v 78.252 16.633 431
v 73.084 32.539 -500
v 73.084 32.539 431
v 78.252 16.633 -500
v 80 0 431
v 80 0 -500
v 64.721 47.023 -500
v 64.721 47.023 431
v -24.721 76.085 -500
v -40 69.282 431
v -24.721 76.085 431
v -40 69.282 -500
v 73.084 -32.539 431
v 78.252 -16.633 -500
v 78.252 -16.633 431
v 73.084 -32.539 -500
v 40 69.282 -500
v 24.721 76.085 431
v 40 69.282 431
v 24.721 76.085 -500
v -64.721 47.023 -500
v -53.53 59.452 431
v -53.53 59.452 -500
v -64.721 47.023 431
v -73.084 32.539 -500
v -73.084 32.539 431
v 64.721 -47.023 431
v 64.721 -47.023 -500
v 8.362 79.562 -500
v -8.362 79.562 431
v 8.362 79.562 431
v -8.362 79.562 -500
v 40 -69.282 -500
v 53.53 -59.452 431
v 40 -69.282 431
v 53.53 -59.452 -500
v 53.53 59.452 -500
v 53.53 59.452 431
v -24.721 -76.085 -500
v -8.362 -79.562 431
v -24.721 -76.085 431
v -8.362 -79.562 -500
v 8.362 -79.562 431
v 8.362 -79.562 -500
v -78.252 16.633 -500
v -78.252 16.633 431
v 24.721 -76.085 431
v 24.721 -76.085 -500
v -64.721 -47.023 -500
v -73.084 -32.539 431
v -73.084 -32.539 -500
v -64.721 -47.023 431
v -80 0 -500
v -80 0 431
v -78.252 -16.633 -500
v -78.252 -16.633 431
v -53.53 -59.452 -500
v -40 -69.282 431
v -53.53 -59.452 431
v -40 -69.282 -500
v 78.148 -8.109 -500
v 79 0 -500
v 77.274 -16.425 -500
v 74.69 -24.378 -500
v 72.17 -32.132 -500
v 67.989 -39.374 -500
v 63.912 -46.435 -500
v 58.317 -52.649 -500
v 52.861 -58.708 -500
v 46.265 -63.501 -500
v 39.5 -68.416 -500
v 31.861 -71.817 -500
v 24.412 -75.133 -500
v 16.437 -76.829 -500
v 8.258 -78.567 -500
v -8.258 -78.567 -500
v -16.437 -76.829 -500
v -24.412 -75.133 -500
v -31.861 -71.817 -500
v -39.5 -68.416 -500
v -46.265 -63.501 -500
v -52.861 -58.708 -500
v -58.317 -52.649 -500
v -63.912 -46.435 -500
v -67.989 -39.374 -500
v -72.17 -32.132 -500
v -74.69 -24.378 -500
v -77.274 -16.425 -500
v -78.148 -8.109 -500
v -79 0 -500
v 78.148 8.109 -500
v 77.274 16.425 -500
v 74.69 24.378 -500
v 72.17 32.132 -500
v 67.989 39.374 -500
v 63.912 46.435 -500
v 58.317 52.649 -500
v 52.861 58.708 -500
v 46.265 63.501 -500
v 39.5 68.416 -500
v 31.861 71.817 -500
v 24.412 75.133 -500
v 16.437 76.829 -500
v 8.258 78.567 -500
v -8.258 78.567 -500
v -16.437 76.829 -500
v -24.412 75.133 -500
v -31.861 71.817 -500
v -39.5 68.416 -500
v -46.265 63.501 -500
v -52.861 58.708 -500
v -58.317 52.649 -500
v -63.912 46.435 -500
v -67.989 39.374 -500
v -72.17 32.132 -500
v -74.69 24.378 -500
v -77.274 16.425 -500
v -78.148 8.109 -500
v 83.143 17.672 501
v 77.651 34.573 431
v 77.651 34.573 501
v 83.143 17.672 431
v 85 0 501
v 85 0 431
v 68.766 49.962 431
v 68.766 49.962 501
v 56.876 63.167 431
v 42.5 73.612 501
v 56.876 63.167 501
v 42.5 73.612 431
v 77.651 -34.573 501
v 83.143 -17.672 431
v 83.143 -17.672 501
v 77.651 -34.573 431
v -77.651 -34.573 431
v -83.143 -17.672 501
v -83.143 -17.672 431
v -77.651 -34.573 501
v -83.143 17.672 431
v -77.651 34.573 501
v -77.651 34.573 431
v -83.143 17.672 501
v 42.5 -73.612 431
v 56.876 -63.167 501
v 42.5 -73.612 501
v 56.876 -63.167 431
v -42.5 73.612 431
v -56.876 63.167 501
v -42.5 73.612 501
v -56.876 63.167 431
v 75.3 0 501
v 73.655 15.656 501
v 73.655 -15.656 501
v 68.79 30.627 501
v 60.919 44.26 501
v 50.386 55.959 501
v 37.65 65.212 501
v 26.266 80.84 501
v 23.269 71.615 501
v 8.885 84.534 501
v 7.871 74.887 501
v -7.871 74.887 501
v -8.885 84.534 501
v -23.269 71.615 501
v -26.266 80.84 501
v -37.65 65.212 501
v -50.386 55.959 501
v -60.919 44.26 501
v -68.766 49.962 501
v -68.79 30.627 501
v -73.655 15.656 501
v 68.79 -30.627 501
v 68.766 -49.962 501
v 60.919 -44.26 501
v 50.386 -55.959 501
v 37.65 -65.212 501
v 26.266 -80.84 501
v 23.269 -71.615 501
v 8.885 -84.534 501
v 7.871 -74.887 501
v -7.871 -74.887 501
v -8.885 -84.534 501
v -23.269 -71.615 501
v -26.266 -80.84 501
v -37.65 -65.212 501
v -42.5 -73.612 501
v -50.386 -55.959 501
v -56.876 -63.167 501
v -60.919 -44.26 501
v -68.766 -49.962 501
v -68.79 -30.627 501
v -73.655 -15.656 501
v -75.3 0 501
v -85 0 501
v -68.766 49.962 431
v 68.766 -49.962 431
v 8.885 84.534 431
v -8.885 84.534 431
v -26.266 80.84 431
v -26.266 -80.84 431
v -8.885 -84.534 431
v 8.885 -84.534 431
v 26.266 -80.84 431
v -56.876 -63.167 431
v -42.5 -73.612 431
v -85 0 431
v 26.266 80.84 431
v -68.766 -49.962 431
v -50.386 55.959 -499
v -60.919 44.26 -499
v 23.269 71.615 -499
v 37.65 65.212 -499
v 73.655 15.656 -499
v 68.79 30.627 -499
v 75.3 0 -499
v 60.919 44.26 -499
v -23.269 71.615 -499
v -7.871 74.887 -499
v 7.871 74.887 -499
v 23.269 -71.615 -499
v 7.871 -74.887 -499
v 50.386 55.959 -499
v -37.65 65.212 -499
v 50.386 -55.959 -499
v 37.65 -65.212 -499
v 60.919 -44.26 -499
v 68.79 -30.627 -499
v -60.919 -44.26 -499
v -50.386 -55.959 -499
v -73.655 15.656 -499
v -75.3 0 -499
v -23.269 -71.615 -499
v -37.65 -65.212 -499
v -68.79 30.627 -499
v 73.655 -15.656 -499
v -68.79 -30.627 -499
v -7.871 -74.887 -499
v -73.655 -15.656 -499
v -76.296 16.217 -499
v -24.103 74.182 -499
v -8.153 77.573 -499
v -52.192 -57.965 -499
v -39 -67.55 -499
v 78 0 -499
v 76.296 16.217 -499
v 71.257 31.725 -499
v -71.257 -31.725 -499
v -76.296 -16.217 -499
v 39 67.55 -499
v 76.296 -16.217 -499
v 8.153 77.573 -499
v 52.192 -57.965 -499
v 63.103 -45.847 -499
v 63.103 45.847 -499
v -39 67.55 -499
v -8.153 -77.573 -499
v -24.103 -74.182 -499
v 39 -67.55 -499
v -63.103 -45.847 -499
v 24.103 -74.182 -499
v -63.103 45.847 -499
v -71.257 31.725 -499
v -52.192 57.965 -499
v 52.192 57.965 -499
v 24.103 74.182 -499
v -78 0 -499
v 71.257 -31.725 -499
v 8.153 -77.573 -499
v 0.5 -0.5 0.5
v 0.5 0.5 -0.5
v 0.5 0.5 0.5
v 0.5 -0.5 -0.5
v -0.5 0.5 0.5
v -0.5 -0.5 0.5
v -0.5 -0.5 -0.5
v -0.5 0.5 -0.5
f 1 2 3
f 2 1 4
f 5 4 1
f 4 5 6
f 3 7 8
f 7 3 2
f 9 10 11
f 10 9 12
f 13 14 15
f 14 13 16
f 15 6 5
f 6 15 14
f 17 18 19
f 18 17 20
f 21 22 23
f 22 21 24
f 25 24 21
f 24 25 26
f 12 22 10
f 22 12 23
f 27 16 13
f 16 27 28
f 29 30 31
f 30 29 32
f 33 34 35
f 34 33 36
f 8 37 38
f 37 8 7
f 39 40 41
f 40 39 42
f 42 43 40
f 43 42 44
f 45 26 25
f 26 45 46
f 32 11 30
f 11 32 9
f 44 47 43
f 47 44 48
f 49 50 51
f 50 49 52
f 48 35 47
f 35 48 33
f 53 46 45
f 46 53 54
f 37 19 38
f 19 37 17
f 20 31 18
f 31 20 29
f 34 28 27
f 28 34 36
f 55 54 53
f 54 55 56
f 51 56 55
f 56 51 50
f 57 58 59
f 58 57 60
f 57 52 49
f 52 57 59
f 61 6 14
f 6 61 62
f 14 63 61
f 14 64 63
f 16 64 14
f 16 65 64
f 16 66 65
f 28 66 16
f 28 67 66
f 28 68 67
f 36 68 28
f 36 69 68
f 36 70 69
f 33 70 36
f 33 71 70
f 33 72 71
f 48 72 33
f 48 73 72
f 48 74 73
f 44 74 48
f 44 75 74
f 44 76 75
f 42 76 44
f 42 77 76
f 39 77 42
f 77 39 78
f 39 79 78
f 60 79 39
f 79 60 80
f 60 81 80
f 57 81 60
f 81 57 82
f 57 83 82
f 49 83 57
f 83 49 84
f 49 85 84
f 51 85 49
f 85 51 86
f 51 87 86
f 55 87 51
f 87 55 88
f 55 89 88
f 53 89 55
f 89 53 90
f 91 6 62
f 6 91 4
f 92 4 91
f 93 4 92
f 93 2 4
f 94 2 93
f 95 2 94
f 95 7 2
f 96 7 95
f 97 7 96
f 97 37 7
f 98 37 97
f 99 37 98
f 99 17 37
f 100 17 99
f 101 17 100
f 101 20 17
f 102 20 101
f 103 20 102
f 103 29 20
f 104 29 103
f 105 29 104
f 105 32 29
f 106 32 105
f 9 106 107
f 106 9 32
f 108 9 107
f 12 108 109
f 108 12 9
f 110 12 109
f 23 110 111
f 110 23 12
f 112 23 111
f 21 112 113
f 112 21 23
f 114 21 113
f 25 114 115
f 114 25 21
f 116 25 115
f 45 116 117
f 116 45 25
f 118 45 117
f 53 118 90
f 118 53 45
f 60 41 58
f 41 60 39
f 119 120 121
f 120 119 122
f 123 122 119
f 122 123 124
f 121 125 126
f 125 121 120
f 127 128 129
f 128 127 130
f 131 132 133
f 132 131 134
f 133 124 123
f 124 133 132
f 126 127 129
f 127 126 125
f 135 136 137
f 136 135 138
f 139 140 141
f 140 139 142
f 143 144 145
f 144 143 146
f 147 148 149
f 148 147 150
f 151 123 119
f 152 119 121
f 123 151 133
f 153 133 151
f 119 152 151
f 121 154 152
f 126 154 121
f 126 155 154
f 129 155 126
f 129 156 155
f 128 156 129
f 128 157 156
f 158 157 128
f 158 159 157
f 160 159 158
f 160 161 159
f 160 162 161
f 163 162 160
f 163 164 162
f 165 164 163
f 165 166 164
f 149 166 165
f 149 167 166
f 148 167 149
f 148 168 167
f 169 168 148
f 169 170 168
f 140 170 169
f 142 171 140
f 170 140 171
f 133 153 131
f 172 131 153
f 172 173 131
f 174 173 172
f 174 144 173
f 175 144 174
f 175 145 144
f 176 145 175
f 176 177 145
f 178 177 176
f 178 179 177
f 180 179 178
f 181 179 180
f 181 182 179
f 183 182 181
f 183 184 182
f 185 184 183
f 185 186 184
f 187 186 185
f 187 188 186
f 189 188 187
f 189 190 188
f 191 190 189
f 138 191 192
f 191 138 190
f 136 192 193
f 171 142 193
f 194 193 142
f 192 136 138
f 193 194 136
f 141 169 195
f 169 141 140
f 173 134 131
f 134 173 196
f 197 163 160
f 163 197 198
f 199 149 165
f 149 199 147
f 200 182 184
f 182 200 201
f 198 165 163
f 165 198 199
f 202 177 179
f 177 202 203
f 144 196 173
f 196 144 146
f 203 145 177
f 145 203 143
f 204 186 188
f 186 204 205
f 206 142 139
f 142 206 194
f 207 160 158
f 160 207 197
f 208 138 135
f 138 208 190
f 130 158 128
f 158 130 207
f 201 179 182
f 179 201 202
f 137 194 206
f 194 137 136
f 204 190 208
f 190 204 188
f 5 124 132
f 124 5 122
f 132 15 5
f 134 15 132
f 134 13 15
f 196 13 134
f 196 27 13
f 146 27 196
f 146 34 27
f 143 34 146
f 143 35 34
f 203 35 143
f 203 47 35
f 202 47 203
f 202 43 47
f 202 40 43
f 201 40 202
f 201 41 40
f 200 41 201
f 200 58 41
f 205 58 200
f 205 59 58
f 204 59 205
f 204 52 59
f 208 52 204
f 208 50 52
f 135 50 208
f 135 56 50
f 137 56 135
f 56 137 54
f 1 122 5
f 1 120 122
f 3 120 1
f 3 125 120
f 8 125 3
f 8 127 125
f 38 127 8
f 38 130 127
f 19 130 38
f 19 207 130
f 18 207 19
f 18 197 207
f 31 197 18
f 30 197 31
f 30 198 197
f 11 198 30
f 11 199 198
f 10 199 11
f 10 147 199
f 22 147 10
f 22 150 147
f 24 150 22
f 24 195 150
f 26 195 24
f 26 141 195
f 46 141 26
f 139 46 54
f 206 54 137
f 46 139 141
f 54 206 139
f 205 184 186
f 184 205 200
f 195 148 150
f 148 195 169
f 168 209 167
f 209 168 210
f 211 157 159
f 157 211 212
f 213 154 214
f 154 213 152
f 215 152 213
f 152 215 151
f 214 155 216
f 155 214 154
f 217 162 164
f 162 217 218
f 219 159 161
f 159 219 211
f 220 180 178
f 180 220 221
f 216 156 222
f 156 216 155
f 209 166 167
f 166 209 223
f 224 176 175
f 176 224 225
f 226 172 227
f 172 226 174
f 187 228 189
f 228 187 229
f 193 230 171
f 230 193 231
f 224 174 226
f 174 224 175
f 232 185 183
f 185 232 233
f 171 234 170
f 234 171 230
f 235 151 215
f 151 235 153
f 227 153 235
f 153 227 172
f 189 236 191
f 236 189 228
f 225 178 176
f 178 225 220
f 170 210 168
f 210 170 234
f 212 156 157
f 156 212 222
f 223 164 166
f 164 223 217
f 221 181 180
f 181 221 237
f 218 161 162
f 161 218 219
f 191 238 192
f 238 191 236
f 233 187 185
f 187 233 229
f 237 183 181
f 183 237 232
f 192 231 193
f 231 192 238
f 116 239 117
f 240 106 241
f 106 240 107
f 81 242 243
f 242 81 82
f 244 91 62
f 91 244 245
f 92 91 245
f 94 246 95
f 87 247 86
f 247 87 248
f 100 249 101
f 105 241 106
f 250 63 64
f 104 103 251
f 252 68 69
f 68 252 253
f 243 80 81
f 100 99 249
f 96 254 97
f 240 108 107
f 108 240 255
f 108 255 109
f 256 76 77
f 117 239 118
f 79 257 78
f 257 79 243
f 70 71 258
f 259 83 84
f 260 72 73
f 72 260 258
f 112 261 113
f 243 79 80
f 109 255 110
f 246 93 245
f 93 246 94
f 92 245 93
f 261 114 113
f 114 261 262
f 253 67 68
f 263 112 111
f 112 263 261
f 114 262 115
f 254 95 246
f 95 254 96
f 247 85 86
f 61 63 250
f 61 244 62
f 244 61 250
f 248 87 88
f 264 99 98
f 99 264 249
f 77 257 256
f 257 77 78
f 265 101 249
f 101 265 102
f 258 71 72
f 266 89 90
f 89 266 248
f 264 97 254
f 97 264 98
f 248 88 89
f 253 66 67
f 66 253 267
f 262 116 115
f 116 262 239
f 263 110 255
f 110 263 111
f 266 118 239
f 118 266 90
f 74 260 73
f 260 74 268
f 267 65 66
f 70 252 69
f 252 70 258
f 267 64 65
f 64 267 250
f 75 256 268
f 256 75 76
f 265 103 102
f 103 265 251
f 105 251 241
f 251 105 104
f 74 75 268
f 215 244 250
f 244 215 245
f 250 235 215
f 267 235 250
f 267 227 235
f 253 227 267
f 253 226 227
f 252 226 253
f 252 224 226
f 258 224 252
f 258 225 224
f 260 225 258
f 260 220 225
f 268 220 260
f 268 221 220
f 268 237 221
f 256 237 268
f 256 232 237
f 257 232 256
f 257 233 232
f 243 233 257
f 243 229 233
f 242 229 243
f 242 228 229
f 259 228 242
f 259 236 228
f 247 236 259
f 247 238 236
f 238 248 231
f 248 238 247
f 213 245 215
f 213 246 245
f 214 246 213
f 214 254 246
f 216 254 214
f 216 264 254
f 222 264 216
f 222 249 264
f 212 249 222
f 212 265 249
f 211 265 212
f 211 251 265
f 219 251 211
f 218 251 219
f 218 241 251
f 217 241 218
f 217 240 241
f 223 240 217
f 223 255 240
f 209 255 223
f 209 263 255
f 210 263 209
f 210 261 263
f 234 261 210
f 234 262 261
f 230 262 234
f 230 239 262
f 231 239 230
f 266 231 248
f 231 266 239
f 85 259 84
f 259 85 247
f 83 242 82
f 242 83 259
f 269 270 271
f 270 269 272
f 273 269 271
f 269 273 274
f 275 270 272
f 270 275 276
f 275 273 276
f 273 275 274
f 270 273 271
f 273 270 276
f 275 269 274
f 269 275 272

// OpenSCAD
// Parameters
pipe_length = 1000; //[500:2000:1]
outer_diameter = 160; //[80:320:1]
wall_thickness = 4.7; //[2.35:9.4:0.1]
socket_length = 70; //[35:140:1]
socket_outer_diameter = 170; //[160:220:1]
chamfer_length = 2; //[1:6:0.5]
overlap = 1; //[0.5:2:0.1]

// Base Shapes
module pipe_body() {
  translate([0, 0, 0])
    cylinder(h=pipe_length, r=outer_diameter/2, center=true);
}

module inner_bore() {
  translate([0, 0, 0])
    cylinder(h=pipe_length + 2*overlap, r=outer_diameter/2 - wall_thickness, center=true);
}

module socket_end() {
  translate([0, 0, pipe_length/2 - socket_length/2 + overlap])
    cylinder(h=socket_length, r=socket_outer_diameter/2, center=true);
}

module chamfer_edges() {
  translate([0, 0, -pipe_length/2 + chamfer_length/2 - overlap])
    cylinder(h=chamfer_length, r1=outer_diameter/2, r2=outer_diameter/2 - chamfer_length, center=true);
}

module markings_text() {
  translate([0, 0, 0])
    cube([overlap, overlap, overlap], center=true);
}

// Operations
module complete_model() {
  union() {
    difference() {
      union() {
        pipe_body();
        socket_end();
      }
      inner_bore();
      chamfer_edges();
    }
    markings_text();
  }
}

// Final Output
complete_model();
